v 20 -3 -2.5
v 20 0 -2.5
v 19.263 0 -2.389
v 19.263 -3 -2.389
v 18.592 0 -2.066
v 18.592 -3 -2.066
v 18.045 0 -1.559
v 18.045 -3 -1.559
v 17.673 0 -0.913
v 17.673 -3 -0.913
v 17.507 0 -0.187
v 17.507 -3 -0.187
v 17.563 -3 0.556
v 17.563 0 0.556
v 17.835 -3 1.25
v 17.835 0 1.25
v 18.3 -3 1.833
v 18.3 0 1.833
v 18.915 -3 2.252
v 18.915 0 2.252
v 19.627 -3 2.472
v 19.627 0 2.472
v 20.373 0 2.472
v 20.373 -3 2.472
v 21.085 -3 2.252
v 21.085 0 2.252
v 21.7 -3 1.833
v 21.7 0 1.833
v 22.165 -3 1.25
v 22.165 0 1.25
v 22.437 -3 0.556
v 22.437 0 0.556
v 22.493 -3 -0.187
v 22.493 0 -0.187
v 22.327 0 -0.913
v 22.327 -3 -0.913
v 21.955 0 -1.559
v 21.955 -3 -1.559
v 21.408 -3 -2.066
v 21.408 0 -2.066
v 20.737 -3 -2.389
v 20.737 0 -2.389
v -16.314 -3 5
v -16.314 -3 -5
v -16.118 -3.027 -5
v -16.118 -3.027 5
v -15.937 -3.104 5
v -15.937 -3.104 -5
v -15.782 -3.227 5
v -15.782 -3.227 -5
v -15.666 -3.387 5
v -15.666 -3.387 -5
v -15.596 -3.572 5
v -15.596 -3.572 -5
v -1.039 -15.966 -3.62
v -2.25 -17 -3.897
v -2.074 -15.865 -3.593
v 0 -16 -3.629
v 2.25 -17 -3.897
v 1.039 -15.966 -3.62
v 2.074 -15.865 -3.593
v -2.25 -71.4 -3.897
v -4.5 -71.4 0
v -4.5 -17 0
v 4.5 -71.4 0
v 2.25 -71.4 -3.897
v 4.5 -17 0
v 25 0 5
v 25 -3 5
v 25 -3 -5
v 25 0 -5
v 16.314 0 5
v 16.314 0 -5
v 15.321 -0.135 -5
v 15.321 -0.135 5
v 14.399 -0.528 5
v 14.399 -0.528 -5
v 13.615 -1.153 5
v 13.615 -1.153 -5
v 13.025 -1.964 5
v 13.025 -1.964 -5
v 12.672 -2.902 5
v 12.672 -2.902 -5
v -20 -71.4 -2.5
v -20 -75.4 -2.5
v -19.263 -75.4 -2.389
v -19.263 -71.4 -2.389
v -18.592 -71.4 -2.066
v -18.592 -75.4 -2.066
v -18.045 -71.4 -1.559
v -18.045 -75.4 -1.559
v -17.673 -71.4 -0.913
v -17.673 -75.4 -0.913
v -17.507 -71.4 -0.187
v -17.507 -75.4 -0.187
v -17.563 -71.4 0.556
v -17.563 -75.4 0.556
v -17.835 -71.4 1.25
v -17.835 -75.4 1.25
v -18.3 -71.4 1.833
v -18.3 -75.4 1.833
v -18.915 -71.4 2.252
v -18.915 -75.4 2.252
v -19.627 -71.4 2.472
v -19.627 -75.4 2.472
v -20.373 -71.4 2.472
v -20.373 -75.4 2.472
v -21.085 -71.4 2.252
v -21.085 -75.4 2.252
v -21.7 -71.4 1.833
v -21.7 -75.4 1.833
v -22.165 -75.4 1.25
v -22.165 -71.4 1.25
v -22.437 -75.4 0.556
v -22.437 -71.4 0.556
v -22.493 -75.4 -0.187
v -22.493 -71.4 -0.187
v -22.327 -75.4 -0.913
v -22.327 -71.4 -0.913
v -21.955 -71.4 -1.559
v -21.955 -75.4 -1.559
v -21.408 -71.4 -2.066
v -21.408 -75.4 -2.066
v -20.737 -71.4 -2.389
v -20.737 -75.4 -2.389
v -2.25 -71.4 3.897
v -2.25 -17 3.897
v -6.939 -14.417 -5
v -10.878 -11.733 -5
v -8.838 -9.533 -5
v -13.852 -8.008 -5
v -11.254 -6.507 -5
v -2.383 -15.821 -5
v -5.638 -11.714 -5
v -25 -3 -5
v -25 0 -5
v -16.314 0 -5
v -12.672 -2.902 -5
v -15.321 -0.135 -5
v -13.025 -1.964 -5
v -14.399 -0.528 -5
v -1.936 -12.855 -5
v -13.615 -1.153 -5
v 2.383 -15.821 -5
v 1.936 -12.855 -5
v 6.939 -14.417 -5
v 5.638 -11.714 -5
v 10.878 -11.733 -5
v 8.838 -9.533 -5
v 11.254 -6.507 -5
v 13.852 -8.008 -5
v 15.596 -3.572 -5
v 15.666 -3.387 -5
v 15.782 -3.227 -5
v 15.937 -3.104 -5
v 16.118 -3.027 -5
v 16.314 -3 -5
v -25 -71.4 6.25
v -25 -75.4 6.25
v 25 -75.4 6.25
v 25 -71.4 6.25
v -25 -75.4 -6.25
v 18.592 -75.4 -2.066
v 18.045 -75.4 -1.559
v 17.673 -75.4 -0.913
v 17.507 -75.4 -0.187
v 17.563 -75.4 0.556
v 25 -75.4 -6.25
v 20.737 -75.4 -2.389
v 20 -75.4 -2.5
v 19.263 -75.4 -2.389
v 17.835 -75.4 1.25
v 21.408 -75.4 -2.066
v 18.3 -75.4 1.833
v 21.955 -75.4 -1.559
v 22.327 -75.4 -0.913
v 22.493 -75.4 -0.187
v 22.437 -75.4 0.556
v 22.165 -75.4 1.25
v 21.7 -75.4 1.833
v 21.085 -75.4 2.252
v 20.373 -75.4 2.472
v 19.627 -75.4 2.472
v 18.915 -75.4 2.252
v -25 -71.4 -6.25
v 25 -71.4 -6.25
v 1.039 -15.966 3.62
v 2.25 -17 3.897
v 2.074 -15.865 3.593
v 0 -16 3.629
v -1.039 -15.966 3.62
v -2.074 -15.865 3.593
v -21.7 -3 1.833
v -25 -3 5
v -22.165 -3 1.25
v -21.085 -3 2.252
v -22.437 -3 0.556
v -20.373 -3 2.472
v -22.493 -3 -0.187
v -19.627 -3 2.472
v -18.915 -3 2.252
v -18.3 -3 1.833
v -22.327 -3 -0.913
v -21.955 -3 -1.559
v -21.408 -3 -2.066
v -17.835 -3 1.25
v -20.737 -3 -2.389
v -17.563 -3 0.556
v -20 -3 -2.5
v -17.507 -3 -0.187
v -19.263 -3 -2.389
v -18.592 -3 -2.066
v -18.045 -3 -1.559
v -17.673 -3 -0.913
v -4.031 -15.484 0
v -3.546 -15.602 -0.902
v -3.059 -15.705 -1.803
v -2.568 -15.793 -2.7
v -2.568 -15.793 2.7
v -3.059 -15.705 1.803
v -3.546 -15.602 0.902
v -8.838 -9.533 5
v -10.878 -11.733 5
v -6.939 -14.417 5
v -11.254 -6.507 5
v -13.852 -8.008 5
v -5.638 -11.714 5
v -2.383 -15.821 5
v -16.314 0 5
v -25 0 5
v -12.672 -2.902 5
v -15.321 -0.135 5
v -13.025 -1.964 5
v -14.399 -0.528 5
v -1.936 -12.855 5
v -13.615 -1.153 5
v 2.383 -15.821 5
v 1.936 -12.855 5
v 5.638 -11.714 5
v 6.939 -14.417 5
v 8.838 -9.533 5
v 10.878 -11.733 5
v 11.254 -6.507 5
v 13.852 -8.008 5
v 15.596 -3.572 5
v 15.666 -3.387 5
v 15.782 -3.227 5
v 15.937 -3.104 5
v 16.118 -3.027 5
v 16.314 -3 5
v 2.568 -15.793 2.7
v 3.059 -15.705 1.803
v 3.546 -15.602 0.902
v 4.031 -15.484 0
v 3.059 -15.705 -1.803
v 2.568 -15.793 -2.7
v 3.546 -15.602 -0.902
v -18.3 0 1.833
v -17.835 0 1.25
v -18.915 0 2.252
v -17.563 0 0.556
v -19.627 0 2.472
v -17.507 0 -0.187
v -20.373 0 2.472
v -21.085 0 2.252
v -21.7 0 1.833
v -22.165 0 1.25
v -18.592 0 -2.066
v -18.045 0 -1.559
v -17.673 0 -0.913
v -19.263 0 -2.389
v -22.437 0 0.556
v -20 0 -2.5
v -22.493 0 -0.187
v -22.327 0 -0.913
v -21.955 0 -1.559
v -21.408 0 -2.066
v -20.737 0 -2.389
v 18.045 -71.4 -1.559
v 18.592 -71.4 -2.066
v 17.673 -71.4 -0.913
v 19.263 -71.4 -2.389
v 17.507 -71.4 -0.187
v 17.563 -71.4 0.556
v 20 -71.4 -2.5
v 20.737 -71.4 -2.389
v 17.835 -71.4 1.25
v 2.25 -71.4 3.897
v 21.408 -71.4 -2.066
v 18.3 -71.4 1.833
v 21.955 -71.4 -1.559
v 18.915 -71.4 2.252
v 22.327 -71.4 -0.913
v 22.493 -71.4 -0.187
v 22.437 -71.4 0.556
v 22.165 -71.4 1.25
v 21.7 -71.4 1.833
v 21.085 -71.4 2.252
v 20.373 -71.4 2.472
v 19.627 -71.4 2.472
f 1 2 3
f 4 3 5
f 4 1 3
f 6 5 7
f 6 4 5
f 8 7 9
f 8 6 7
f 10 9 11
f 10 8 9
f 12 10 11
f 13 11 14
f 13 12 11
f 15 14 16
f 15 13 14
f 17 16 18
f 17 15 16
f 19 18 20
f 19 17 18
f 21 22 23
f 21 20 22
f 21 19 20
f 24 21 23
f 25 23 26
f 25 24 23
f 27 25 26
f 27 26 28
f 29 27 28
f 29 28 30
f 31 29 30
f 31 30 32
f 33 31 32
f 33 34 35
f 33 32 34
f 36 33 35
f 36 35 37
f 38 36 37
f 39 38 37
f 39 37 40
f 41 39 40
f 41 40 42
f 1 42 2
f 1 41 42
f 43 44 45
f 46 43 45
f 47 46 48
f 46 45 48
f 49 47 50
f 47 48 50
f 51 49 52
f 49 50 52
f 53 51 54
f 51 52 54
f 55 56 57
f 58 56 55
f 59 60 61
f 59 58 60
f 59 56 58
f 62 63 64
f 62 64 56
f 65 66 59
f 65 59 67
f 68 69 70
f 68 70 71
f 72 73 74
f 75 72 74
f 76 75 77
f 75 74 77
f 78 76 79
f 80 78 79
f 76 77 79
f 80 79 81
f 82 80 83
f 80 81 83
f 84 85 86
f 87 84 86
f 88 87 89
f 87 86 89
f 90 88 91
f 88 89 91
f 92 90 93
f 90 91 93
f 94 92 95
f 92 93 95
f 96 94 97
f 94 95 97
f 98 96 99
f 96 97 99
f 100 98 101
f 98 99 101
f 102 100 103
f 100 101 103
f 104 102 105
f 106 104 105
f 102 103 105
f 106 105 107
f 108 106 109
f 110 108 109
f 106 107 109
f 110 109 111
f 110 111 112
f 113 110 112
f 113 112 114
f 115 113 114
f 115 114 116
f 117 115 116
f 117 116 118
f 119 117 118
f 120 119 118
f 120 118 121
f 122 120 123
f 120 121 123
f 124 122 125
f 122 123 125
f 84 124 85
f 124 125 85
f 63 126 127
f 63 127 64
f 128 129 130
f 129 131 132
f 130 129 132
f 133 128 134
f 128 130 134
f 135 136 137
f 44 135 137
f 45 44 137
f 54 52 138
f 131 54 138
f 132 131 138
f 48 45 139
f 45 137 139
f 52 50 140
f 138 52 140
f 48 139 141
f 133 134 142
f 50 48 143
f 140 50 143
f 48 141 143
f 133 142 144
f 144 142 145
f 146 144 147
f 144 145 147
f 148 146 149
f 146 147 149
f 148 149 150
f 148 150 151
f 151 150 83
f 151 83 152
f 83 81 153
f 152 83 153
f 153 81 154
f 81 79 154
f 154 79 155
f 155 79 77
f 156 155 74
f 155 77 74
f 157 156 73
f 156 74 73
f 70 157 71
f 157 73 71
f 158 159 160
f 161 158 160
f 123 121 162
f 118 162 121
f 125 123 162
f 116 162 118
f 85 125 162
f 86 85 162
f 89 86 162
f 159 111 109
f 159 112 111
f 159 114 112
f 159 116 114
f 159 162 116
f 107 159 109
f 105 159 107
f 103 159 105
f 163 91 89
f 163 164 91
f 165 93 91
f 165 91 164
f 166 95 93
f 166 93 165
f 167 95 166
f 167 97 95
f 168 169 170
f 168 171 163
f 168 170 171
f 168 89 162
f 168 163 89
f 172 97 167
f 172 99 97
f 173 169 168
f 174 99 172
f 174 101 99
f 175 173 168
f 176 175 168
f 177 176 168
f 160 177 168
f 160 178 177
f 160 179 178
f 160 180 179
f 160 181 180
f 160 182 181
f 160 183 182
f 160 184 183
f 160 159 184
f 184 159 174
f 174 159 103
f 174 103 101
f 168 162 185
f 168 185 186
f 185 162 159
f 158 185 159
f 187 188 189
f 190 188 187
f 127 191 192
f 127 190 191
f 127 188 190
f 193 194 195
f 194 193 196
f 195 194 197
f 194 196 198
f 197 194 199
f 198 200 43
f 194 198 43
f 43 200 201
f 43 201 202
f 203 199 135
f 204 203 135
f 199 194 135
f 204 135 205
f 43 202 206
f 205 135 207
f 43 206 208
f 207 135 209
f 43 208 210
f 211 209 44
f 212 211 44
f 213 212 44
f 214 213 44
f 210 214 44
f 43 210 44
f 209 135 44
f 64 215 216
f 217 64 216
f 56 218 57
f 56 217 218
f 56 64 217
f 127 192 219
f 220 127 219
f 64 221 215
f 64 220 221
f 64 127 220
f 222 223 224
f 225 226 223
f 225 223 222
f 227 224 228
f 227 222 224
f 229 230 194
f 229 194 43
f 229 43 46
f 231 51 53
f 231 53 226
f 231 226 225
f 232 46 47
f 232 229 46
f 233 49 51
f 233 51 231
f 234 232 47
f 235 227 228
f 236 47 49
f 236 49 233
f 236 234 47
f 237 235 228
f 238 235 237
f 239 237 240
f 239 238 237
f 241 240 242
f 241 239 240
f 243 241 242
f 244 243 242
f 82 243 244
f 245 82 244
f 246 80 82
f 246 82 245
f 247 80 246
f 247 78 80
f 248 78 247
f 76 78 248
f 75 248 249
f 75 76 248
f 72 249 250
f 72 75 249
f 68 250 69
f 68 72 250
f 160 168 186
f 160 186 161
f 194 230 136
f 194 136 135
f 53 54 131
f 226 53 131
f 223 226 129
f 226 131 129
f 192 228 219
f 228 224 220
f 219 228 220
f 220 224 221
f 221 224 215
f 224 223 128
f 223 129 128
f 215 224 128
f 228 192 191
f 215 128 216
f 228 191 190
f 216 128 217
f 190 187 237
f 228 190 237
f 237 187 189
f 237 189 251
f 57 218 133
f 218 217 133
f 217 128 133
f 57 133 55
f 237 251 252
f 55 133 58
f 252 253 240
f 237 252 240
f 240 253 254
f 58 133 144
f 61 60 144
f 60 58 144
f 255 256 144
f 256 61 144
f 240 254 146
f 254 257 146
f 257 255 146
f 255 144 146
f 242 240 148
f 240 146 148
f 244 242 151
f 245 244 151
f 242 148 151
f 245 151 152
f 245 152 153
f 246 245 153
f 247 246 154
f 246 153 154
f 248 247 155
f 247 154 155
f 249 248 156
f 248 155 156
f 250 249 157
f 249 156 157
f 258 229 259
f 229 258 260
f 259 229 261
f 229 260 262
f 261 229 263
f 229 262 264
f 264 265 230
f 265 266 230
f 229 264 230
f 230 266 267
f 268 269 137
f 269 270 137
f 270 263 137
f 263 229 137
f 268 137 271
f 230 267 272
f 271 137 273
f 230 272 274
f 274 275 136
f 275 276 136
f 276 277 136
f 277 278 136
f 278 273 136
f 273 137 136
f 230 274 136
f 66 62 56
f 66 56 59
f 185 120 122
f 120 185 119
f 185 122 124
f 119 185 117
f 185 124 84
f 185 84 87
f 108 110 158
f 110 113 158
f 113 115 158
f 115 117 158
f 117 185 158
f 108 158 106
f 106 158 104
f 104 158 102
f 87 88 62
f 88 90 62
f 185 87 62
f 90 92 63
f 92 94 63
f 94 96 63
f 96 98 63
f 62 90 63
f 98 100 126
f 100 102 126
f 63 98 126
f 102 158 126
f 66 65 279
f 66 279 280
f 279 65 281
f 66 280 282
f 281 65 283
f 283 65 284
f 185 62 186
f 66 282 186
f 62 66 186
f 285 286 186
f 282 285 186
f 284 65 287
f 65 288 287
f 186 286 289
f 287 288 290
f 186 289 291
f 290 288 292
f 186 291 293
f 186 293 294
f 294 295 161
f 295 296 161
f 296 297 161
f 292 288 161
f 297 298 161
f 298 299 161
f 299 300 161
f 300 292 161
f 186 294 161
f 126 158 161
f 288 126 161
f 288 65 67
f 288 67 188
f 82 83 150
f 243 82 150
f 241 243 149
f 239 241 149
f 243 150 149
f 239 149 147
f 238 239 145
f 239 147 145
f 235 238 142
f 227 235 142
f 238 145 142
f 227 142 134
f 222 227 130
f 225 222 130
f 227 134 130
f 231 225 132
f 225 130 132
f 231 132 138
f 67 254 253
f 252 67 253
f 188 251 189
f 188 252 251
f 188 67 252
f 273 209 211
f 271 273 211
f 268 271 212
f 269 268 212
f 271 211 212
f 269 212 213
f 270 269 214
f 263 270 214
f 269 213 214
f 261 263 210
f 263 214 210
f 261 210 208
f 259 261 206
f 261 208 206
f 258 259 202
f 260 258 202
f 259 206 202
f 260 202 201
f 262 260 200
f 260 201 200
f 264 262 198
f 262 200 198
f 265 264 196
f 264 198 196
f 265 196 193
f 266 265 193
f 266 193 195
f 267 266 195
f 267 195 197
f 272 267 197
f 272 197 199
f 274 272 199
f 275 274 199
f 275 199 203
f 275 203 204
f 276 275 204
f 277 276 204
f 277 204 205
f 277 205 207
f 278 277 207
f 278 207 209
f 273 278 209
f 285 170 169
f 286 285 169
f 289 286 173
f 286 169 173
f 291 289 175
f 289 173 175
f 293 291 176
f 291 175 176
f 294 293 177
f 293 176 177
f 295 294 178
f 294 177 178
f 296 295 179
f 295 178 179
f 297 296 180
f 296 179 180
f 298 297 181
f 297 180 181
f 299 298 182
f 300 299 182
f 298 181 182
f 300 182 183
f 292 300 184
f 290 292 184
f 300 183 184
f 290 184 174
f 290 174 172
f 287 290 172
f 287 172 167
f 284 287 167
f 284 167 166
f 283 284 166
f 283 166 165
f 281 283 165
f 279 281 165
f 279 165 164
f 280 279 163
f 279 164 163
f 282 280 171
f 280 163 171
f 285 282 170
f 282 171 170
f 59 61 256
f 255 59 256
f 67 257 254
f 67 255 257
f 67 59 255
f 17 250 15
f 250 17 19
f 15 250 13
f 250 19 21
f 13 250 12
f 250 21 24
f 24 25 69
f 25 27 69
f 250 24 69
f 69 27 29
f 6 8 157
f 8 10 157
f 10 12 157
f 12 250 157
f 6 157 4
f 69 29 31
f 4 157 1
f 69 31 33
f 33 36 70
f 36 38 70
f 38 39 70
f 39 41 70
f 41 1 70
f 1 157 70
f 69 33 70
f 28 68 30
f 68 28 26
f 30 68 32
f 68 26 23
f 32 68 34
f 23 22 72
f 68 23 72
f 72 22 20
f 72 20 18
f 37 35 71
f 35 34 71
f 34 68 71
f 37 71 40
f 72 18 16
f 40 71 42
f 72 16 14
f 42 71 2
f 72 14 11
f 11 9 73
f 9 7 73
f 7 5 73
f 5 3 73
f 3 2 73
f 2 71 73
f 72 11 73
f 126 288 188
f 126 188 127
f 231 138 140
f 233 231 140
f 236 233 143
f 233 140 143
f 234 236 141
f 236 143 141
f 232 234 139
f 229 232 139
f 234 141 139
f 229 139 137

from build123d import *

# Parameters (mm, degrees)
BASE_FLANGE1_START  = -5
BASE_FLANGE1_DEPTH  = 10
SKETCH7_R           = 2.5
CUT_EXTRUDE2_DEPTH  = 10
BOSS_EXTRUDE1_START = 1
BOSS_EXTRUDE1_DEPTH = 2
BOSS_EXTRUDE1_DRAFT = -15
BOSS_EXTRUDE2_DEPTH = 54.4
BOSS_EXTRUDE3_START = 4
SKETCH10_W          = 50
SKETCH10_H          = 12.5
SKETCH10_R          = 2.5
BOSS_EXTRUDE3_DEPTH = 4


# Read off the part's stored shape, not the designer's step: Base-Flange1
with BuildPart() as part:
    # Base-Flange1 outline → Base-Flange1 (new body)
    with BuildSketch(Plane.XY.offset(BASE_FLANGE1_START)):
        with BuildLine():
            Line((-16.314153364, 0), (-25, 0))
            Line((-25, 0), (-25, -3))
            Line((-25, -3), (-16.314153364, -3))
            ThreePointArc((-16.314153364, -3), (-15.855108879, -3.160529066), (-15.596145802, -3.57214727))
            ThreePointArc((-15.596145802, -3.57214727), (0, -16), (15.596145802, -3.57214727))
            ThreePointArc((15.596145802, -3.57214727), (15.855108879, -3.160529066), (16.314153364, -3))
            Line((16.314153364, -3), (25, -3))
            Line((25, -3), (25, 0))
            Line((25, 0), (16.314153364, 0))
            ThreePointArc((16.314153364, 0), (13.985527754, -0.814326513), (12.671868464, -2.902369657))
            ThreePointArc((12.671868464, -2.902369657), (0, -13), (-12.671868464, -2.902369657))
            ThreePointArc((-12.671868464, -2.902369657), (-13.985527754, -0.814326513), (-16.314153364, 0))
        make_face()
    extrude(amount=BASE_FLANGE1_DEPTH)

    # Sketch7 → Cut-Extrude2 (cut)
    with BuildSketch(Plane.XZ.offset(3)):
        with Locations(Location((-20, 0, 0), (0, 0, 270))):
            Circle(SKETCH7_R)
    cut_extrude2 = extrude(amount=-CUT_EXTRUDE2_DEPTH, mode=Mode.SUBTRACT)

    # Mirror1: Cut-Extrude2 across plane
    add(cut_extrude2.mirror(Plane(origin=(0, 0, 0), x_dir=(0, 0, 1), z_dir=(1, 0, 0))), mode=Mode.SUBTRACT)


with BuildPart() as boss_extrude1_tool:
    # Sketch8 → Boss-Extrude1 (with draft: the straight prism first)
    with BuildSketch(Plane(origin=(0, -16, 0), x_dir=(-1, 0, 0), z_dir=(0, -1, 0)).offset(BOSS_EXTRUDE1_START)):
        Polygon((-2.25, -3.897114317), (2.25, -3.897114317), (4.5, 0), (2.25, 3.897114317), (-2.25, 3.897114317), (-4.5, 0), align=None)
    extrude(amount=-BOSS_EXTRUDE1_DEPTH)
    # Boss-Extrude1: the draft: its side faces are tilted about the plane it starts from
    boss_extrude1_sides = [boss_extrude1_tool.faces().sort_by_distance(p)[0] for p in [
        (0, -16, 3.897114317),
        (-3.375, -16, 1.948557159),
        (-3.375, -16, -1.948557159),
        (0, -16, -3.897114317),
        (3.375, -16, -1.948557159),
        (3.375, -16, 1.948557159),
    ]]
    draft(boss_extrude1_sides, Plane(origin=(0, -16, 0), x_dir=(-1, 0, 0), z_dir=(0, -1, 0)).offset(BOSS_EXTRUDE1_START), BOSS_EXTRUDE1_DRAFT)


with BuildPart() as part_1:
    add(part.part)

    # Boss-Extrude1: add boss_extrude1_tool
    add(boss_extrude1_tool.part)

    # Sketch9 → Boss-Extrude2 (add)
    with BuildSketch(Plane.XZ.offset(17)):
        Polygon((4.5, 0), (2.25, 3.897114317), (-2.25, 3.897114317), (-4.5, 0), (-2.25, -3.897114317), (2.25, -3.897114317), align=None)
    extrude(amount=BOSS_EXTRUDE2_DEPTH)

    # Sketch10 → Boss-Extrude3 (add)
    with BuildSketch(Plane.XZ.offset(71.4).offset(BOSS_EXTRUDE3_START)):
        Rectangle(SKETCH10_W, SKETCH10_H)
        with Locations(Location((-20, 0, 0), (0, 0, 270))):
            Circle(SKETCH10_R, mode=Mode.SUBTRACT)
        with Locations(Location((20, 0, 0), (0, 0, 270))):
            Circle(SKETCH10_R, mode=Mode.SUBTRACT)
    extrude(amount=-BOSS_EXTRUDE3_DEPTH)


solid = part_1.part
